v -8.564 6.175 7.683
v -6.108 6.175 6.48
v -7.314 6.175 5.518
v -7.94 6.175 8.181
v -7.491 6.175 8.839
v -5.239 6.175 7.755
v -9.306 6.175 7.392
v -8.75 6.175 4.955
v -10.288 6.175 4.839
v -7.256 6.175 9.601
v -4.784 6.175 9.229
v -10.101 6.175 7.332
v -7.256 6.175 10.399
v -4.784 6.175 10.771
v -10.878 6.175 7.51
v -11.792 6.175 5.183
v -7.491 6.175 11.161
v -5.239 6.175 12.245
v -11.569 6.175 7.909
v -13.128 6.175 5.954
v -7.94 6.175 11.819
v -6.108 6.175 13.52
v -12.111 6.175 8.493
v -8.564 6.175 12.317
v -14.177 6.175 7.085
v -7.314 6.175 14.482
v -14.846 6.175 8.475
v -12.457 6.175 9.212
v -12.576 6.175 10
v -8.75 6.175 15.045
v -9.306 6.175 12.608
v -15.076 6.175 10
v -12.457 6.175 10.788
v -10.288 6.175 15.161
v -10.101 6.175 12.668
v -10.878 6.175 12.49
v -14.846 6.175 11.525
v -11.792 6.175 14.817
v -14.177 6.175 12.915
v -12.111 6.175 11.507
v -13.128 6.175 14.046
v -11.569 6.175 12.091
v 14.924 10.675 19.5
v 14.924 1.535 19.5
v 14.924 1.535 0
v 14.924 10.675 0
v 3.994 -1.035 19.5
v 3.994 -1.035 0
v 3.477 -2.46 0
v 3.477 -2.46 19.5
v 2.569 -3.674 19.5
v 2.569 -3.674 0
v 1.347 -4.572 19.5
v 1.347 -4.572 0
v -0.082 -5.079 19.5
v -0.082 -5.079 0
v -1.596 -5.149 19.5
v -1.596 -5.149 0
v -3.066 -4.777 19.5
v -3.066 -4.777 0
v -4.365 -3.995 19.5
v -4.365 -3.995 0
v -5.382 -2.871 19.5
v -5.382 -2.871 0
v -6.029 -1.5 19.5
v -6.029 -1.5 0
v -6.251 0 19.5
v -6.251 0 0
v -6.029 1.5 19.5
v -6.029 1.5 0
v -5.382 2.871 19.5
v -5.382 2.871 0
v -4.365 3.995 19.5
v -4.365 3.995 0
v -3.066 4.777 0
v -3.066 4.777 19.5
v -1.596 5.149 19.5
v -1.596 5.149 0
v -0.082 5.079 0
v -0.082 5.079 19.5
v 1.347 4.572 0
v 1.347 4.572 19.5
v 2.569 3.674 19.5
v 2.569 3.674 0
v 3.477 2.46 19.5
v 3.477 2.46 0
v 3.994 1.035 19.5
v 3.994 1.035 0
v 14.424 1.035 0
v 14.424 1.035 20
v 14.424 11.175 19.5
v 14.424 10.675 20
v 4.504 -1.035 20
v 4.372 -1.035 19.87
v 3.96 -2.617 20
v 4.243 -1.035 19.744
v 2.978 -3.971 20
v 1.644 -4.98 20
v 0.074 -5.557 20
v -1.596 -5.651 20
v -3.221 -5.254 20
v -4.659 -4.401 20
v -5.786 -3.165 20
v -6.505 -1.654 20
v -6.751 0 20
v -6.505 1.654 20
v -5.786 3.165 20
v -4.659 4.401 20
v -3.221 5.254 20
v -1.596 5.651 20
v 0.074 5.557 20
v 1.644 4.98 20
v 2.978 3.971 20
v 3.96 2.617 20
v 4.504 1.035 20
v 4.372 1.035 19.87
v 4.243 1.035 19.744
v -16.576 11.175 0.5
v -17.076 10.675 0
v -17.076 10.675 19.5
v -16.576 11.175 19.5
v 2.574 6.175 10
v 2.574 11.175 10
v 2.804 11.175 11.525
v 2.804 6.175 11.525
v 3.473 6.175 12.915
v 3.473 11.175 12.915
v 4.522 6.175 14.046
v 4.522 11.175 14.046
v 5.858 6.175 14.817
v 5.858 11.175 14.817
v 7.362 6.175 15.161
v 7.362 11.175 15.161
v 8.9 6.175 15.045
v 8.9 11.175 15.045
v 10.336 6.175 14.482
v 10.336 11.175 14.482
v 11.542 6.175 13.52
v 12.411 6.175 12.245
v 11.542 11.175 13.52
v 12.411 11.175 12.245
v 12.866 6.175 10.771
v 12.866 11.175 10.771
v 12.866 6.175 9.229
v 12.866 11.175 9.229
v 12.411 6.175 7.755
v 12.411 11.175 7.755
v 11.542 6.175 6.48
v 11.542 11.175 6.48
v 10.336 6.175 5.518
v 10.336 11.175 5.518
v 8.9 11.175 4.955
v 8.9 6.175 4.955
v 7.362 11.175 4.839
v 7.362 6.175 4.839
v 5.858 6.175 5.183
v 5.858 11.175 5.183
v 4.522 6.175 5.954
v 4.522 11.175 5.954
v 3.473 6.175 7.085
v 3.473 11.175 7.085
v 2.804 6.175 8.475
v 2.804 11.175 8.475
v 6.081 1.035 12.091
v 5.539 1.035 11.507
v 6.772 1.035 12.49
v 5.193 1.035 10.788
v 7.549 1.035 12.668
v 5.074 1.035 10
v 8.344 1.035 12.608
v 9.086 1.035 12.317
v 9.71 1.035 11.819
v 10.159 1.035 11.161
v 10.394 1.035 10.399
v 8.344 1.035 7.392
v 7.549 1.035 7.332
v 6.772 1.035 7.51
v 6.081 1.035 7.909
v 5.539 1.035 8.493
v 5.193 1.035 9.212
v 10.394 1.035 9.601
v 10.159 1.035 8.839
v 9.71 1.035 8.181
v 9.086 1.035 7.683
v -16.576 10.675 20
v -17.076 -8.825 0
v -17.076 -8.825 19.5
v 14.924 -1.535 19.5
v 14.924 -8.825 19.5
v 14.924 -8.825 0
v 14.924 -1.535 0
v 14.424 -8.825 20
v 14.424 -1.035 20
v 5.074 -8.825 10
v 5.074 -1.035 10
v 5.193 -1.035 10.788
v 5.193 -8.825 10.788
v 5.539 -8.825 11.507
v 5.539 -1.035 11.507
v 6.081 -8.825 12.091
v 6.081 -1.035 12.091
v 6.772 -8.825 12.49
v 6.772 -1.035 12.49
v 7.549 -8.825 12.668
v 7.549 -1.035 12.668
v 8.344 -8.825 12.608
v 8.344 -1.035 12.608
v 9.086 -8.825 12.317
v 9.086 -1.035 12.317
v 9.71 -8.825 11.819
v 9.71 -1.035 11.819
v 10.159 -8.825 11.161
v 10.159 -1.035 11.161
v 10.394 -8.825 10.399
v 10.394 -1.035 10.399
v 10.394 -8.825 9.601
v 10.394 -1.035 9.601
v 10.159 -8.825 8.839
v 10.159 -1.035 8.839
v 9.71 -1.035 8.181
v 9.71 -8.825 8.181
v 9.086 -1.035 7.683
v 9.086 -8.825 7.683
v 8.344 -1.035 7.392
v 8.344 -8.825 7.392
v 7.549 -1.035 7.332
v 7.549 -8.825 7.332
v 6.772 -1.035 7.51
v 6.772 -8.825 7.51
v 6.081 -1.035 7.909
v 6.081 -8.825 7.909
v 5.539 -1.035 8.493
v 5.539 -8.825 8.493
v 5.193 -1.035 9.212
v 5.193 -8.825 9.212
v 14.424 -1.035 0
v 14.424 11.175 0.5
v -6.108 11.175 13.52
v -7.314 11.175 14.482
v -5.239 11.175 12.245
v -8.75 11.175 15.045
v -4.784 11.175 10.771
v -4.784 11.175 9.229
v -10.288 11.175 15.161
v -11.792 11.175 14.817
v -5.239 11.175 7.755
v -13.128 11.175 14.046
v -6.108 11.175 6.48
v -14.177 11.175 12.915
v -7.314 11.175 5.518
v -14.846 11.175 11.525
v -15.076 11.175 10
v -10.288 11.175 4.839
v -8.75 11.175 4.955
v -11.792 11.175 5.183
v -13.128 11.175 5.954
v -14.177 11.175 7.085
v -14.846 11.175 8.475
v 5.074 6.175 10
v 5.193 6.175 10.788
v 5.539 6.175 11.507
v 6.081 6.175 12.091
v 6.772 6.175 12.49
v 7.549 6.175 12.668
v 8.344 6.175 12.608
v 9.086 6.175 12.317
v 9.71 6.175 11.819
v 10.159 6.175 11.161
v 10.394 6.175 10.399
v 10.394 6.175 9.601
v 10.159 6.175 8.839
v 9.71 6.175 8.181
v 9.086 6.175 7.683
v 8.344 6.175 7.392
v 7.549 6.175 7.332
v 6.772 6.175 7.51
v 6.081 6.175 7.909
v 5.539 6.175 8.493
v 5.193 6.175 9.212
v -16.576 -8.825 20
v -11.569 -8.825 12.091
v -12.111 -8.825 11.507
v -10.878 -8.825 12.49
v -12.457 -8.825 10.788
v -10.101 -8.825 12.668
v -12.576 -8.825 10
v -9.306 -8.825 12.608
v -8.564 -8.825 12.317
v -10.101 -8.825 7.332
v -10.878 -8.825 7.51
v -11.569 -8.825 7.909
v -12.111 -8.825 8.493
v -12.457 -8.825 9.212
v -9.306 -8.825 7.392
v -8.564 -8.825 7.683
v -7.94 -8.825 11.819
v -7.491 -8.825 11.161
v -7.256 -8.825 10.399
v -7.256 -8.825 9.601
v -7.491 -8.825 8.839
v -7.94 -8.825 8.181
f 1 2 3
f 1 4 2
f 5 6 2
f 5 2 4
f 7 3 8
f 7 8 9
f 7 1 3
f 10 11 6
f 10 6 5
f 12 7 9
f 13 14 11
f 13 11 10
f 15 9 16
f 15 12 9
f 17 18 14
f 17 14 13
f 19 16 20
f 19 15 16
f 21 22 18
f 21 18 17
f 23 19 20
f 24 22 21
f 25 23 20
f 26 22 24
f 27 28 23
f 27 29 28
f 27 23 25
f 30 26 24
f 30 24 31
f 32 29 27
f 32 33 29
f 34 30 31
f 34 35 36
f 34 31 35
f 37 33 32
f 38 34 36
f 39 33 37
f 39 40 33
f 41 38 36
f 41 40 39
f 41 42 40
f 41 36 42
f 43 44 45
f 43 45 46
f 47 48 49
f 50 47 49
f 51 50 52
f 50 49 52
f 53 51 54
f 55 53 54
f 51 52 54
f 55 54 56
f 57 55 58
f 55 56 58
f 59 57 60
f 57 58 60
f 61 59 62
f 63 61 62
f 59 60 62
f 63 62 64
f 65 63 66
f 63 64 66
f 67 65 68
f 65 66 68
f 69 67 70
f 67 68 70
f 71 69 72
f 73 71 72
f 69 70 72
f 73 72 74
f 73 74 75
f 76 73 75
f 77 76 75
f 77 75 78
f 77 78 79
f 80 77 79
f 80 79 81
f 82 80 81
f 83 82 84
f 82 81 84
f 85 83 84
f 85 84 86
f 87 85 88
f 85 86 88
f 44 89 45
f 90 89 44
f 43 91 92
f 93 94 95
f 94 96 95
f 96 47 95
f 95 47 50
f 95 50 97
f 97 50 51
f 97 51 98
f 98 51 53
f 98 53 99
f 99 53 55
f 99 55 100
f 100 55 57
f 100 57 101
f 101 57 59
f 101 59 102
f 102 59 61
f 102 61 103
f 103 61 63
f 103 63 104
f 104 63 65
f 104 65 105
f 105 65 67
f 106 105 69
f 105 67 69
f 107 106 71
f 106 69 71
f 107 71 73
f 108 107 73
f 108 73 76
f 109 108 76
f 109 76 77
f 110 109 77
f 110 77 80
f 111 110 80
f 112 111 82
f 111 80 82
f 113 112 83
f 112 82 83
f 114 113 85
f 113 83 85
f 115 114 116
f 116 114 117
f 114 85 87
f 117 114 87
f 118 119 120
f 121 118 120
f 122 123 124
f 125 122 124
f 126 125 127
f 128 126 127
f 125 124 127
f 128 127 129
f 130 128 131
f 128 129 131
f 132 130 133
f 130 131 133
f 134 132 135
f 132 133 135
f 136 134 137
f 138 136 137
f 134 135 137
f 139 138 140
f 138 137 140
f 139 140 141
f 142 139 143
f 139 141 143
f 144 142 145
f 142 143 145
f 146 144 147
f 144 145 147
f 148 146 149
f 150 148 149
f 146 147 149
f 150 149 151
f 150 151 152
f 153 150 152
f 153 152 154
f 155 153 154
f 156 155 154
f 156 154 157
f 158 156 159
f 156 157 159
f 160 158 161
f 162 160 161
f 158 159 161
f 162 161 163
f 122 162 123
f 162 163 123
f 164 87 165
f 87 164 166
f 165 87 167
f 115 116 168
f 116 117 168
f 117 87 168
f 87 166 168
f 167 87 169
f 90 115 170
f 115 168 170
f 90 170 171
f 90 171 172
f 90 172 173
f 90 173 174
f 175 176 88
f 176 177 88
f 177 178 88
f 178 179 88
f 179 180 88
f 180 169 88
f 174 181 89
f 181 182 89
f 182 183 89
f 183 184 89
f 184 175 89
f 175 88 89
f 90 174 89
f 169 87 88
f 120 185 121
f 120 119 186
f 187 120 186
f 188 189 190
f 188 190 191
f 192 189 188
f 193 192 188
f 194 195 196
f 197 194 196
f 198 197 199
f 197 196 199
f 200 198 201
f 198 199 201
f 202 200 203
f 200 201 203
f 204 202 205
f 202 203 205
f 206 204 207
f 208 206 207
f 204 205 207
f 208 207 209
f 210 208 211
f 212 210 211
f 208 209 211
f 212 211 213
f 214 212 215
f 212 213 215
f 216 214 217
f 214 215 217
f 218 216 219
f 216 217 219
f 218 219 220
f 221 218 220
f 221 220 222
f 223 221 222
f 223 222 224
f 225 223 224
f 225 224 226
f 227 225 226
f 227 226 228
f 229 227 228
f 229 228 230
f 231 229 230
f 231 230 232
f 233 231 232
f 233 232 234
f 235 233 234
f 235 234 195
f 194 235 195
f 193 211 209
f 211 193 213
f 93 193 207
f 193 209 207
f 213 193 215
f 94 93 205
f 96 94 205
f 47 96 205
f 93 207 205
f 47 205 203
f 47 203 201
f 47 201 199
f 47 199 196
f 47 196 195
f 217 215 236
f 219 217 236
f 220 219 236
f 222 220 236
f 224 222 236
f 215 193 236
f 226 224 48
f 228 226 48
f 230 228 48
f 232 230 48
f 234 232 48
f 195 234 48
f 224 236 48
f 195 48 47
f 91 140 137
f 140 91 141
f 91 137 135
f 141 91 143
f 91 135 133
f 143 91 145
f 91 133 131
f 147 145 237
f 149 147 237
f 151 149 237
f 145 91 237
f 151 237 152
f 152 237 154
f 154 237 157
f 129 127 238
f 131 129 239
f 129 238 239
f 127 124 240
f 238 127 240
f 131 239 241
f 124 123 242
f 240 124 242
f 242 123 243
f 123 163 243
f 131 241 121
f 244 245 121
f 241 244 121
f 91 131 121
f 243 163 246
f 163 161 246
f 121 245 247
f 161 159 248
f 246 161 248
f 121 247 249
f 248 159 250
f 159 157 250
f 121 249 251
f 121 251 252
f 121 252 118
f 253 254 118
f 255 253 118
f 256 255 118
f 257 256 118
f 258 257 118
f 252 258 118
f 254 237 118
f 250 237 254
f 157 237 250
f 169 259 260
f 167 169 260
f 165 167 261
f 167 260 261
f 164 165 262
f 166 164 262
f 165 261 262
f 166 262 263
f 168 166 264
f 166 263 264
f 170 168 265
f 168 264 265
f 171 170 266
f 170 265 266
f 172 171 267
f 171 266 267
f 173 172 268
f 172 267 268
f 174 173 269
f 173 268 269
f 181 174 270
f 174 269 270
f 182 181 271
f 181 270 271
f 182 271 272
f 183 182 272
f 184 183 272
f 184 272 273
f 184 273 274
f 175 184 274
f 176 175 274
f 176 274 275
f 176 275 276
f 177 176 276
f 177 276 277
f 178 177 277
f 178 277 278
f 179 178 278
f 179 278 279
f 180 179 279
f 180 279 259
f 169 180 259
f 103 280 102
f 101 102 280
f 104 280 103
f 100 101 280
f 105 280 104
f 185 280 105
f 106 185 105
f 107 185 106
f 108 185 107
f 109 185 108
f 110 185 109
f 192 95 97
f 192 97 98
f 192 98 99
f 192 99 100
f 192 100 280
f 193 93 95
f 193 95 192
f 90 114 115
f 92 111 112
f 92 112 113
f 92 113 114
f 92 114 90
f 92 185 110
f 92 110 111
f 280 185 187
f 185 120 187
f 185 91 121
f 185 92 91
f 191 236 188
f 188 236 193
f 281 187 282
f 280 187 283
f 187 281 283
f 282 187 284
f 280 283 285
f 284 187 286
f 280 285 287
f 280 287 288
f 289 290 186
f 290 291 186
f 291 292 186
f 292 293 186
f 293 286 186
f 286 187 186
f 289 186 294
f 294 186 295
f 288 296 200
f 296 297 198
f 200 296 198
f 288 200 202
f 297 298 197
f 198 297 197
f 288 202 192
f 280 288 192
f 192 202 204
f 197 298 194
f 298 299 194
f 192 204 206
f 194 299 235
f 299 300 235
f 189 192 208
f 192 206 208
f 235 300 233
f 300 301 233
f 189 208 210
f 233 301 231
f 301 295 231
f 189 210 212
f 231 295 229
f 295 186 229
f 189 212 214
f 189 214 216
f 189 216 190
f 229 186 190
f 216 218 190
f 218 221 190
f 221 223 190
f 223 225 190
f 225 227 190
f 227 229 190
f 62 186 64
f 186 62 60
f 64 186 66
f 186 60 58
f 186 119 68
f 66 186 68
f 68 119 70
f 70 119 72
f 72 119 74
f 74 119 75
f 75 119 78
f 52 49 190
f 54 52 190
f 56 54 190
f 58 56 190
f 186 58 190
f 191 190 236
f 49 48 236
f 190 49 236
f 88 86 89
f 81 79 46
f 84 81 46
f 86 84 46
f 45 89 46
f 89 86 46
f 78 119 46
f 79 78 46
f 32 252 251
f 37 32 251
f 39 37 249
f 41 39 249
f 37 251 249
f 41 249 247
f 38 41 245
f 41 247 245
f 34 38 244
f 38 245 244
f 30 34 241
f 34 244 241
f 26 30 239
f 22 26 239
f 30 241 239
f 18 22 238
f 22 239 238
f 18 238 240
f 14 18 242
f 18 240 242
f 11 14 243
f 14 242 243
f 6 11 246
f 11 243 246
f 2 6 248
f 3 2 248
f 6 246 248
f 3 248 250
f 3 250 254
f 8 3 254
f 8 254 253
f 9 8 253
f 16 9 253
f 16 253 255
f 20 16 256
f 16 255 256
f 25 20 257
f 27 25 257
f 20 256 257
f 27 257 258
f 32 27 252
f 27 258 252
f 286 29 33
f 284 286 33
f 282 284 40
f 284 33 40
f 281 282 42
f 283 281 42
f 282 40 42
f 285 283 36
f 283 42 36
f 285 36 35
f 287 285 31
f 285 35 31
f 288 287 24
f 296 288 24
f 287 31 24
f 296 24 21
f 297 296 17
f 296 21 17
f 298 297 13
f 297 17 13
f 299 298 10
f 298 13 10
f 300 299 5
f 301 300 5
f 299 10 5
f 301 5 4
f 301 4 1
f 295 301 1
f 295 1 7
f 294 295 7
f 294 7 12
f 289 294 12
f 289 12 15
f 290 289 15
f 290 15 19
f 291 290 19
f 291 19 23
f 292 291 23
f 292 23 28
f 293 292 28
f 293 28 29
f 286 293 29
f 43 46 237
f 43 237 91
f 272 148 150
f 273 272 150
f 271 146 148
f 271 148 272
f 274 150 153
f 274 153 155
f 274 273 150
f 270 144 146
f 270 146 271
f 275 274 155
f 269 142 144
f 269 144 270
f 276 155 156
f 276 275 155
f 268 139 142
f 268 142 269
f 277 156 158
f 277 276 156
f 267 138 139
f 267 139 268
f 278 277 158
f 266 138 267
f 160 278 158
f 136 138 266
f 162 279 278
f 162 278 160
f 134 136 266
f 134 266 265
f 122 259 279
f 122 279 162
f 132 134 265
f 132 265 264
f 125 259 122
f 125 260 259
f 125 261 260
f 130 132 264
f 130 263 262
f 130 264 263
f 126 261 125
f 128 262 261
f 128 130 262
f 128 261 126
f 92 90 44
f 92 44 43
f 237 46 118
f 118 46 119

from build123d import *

# Parameters (mm, degrees)
F1_DEPTH = 20
F2_R     = 2.675
F3_DEPTH = 20
F2_R_2   = 5.175
F4_DEPTH = 5
F5_SIZE  = 0.5


with BuildPart() as f1:
    # F0 (on Top) → F1 (new body)
    with BuildSketch(Plane.XY):
        with BuildLine():
            Line((14.923915, 11.175), (-17.076085, 11.175))
            Line((-17.076085, 11.175), (-17.076085, -8.825))
            Line((-17.076085, -8.825), (14.923915, -8.825))
            Line((14.923915, -8.825), (14.923915, -1.035))
            Line((14.923915, -1.035), (3.994358, -1.035))
            ThreePointArc((3.994358, -1.035), (-6.251085, 0), (3.994358, 1.035))
            Line((3.994358, 1.035), (14.923915, 1.035))
            Line((14.923915, 1.035), (14.923915, 11.175))
        make_face()
    extrude(amount=F1_DEPTH)

    # F2 (on face) → F3 (cut)
    with BuildSketch(Plane(origin=(0, 11.175, 0), x_dir=(-1, 0, 0), z_dir=(0, 1, 0))):
        with Locations((-7.748915, 10)):
            Circle(F2_R)
        with Locations((9.901085, 10)):
            Circle(F2_R)
    extrude(amount=-F3_DEPTH, mode=Mode.SUBTRACT)

    # F2 (on face) → F4 (cut)
    with BuildSketch(Plane(origin=(0, 11.175, 0), x_dir=(-1, 0, 0), z_dir=(0, 1, 0))):
        with Locations((-7.748915, 10)):
            Circle(F2_R_2)
        with Locations((-7.748915, 10)):
            Circle(F2_R, mode=Mode.SUBTRACT)
        with Locations((9.901085, 10)):
            Circle(F2_R_2)
        with Locations((9.901085, 10)):
            Circle(F2_R, mode=Mode.SUBTRACT)
    extrude(amount=-F4_DEPTH, mode=Mode.SUBTRACT)

    # F5
    f5_edges = [f1.edges().sort_by_distance(p)[0] for p in [
        (14.923915, -1.035, 10),
        (-17.076085, 1.175, 20),
        (-1.076085, 11.175, 20),
        (-17.076085, 11.175, 10),
        (14.923915, 11.175, 10),
        (14.923915, 6.105, 20),
        (14.923915, -4.93, 20),
        (-6.251085, 0, 20),
        (14.923915, 1.035, 10),
        (-1.076085, 11.175, 0),
    ]]
    chamfer(f5_edges, length=F5_SIZE)


solid = f1.part
